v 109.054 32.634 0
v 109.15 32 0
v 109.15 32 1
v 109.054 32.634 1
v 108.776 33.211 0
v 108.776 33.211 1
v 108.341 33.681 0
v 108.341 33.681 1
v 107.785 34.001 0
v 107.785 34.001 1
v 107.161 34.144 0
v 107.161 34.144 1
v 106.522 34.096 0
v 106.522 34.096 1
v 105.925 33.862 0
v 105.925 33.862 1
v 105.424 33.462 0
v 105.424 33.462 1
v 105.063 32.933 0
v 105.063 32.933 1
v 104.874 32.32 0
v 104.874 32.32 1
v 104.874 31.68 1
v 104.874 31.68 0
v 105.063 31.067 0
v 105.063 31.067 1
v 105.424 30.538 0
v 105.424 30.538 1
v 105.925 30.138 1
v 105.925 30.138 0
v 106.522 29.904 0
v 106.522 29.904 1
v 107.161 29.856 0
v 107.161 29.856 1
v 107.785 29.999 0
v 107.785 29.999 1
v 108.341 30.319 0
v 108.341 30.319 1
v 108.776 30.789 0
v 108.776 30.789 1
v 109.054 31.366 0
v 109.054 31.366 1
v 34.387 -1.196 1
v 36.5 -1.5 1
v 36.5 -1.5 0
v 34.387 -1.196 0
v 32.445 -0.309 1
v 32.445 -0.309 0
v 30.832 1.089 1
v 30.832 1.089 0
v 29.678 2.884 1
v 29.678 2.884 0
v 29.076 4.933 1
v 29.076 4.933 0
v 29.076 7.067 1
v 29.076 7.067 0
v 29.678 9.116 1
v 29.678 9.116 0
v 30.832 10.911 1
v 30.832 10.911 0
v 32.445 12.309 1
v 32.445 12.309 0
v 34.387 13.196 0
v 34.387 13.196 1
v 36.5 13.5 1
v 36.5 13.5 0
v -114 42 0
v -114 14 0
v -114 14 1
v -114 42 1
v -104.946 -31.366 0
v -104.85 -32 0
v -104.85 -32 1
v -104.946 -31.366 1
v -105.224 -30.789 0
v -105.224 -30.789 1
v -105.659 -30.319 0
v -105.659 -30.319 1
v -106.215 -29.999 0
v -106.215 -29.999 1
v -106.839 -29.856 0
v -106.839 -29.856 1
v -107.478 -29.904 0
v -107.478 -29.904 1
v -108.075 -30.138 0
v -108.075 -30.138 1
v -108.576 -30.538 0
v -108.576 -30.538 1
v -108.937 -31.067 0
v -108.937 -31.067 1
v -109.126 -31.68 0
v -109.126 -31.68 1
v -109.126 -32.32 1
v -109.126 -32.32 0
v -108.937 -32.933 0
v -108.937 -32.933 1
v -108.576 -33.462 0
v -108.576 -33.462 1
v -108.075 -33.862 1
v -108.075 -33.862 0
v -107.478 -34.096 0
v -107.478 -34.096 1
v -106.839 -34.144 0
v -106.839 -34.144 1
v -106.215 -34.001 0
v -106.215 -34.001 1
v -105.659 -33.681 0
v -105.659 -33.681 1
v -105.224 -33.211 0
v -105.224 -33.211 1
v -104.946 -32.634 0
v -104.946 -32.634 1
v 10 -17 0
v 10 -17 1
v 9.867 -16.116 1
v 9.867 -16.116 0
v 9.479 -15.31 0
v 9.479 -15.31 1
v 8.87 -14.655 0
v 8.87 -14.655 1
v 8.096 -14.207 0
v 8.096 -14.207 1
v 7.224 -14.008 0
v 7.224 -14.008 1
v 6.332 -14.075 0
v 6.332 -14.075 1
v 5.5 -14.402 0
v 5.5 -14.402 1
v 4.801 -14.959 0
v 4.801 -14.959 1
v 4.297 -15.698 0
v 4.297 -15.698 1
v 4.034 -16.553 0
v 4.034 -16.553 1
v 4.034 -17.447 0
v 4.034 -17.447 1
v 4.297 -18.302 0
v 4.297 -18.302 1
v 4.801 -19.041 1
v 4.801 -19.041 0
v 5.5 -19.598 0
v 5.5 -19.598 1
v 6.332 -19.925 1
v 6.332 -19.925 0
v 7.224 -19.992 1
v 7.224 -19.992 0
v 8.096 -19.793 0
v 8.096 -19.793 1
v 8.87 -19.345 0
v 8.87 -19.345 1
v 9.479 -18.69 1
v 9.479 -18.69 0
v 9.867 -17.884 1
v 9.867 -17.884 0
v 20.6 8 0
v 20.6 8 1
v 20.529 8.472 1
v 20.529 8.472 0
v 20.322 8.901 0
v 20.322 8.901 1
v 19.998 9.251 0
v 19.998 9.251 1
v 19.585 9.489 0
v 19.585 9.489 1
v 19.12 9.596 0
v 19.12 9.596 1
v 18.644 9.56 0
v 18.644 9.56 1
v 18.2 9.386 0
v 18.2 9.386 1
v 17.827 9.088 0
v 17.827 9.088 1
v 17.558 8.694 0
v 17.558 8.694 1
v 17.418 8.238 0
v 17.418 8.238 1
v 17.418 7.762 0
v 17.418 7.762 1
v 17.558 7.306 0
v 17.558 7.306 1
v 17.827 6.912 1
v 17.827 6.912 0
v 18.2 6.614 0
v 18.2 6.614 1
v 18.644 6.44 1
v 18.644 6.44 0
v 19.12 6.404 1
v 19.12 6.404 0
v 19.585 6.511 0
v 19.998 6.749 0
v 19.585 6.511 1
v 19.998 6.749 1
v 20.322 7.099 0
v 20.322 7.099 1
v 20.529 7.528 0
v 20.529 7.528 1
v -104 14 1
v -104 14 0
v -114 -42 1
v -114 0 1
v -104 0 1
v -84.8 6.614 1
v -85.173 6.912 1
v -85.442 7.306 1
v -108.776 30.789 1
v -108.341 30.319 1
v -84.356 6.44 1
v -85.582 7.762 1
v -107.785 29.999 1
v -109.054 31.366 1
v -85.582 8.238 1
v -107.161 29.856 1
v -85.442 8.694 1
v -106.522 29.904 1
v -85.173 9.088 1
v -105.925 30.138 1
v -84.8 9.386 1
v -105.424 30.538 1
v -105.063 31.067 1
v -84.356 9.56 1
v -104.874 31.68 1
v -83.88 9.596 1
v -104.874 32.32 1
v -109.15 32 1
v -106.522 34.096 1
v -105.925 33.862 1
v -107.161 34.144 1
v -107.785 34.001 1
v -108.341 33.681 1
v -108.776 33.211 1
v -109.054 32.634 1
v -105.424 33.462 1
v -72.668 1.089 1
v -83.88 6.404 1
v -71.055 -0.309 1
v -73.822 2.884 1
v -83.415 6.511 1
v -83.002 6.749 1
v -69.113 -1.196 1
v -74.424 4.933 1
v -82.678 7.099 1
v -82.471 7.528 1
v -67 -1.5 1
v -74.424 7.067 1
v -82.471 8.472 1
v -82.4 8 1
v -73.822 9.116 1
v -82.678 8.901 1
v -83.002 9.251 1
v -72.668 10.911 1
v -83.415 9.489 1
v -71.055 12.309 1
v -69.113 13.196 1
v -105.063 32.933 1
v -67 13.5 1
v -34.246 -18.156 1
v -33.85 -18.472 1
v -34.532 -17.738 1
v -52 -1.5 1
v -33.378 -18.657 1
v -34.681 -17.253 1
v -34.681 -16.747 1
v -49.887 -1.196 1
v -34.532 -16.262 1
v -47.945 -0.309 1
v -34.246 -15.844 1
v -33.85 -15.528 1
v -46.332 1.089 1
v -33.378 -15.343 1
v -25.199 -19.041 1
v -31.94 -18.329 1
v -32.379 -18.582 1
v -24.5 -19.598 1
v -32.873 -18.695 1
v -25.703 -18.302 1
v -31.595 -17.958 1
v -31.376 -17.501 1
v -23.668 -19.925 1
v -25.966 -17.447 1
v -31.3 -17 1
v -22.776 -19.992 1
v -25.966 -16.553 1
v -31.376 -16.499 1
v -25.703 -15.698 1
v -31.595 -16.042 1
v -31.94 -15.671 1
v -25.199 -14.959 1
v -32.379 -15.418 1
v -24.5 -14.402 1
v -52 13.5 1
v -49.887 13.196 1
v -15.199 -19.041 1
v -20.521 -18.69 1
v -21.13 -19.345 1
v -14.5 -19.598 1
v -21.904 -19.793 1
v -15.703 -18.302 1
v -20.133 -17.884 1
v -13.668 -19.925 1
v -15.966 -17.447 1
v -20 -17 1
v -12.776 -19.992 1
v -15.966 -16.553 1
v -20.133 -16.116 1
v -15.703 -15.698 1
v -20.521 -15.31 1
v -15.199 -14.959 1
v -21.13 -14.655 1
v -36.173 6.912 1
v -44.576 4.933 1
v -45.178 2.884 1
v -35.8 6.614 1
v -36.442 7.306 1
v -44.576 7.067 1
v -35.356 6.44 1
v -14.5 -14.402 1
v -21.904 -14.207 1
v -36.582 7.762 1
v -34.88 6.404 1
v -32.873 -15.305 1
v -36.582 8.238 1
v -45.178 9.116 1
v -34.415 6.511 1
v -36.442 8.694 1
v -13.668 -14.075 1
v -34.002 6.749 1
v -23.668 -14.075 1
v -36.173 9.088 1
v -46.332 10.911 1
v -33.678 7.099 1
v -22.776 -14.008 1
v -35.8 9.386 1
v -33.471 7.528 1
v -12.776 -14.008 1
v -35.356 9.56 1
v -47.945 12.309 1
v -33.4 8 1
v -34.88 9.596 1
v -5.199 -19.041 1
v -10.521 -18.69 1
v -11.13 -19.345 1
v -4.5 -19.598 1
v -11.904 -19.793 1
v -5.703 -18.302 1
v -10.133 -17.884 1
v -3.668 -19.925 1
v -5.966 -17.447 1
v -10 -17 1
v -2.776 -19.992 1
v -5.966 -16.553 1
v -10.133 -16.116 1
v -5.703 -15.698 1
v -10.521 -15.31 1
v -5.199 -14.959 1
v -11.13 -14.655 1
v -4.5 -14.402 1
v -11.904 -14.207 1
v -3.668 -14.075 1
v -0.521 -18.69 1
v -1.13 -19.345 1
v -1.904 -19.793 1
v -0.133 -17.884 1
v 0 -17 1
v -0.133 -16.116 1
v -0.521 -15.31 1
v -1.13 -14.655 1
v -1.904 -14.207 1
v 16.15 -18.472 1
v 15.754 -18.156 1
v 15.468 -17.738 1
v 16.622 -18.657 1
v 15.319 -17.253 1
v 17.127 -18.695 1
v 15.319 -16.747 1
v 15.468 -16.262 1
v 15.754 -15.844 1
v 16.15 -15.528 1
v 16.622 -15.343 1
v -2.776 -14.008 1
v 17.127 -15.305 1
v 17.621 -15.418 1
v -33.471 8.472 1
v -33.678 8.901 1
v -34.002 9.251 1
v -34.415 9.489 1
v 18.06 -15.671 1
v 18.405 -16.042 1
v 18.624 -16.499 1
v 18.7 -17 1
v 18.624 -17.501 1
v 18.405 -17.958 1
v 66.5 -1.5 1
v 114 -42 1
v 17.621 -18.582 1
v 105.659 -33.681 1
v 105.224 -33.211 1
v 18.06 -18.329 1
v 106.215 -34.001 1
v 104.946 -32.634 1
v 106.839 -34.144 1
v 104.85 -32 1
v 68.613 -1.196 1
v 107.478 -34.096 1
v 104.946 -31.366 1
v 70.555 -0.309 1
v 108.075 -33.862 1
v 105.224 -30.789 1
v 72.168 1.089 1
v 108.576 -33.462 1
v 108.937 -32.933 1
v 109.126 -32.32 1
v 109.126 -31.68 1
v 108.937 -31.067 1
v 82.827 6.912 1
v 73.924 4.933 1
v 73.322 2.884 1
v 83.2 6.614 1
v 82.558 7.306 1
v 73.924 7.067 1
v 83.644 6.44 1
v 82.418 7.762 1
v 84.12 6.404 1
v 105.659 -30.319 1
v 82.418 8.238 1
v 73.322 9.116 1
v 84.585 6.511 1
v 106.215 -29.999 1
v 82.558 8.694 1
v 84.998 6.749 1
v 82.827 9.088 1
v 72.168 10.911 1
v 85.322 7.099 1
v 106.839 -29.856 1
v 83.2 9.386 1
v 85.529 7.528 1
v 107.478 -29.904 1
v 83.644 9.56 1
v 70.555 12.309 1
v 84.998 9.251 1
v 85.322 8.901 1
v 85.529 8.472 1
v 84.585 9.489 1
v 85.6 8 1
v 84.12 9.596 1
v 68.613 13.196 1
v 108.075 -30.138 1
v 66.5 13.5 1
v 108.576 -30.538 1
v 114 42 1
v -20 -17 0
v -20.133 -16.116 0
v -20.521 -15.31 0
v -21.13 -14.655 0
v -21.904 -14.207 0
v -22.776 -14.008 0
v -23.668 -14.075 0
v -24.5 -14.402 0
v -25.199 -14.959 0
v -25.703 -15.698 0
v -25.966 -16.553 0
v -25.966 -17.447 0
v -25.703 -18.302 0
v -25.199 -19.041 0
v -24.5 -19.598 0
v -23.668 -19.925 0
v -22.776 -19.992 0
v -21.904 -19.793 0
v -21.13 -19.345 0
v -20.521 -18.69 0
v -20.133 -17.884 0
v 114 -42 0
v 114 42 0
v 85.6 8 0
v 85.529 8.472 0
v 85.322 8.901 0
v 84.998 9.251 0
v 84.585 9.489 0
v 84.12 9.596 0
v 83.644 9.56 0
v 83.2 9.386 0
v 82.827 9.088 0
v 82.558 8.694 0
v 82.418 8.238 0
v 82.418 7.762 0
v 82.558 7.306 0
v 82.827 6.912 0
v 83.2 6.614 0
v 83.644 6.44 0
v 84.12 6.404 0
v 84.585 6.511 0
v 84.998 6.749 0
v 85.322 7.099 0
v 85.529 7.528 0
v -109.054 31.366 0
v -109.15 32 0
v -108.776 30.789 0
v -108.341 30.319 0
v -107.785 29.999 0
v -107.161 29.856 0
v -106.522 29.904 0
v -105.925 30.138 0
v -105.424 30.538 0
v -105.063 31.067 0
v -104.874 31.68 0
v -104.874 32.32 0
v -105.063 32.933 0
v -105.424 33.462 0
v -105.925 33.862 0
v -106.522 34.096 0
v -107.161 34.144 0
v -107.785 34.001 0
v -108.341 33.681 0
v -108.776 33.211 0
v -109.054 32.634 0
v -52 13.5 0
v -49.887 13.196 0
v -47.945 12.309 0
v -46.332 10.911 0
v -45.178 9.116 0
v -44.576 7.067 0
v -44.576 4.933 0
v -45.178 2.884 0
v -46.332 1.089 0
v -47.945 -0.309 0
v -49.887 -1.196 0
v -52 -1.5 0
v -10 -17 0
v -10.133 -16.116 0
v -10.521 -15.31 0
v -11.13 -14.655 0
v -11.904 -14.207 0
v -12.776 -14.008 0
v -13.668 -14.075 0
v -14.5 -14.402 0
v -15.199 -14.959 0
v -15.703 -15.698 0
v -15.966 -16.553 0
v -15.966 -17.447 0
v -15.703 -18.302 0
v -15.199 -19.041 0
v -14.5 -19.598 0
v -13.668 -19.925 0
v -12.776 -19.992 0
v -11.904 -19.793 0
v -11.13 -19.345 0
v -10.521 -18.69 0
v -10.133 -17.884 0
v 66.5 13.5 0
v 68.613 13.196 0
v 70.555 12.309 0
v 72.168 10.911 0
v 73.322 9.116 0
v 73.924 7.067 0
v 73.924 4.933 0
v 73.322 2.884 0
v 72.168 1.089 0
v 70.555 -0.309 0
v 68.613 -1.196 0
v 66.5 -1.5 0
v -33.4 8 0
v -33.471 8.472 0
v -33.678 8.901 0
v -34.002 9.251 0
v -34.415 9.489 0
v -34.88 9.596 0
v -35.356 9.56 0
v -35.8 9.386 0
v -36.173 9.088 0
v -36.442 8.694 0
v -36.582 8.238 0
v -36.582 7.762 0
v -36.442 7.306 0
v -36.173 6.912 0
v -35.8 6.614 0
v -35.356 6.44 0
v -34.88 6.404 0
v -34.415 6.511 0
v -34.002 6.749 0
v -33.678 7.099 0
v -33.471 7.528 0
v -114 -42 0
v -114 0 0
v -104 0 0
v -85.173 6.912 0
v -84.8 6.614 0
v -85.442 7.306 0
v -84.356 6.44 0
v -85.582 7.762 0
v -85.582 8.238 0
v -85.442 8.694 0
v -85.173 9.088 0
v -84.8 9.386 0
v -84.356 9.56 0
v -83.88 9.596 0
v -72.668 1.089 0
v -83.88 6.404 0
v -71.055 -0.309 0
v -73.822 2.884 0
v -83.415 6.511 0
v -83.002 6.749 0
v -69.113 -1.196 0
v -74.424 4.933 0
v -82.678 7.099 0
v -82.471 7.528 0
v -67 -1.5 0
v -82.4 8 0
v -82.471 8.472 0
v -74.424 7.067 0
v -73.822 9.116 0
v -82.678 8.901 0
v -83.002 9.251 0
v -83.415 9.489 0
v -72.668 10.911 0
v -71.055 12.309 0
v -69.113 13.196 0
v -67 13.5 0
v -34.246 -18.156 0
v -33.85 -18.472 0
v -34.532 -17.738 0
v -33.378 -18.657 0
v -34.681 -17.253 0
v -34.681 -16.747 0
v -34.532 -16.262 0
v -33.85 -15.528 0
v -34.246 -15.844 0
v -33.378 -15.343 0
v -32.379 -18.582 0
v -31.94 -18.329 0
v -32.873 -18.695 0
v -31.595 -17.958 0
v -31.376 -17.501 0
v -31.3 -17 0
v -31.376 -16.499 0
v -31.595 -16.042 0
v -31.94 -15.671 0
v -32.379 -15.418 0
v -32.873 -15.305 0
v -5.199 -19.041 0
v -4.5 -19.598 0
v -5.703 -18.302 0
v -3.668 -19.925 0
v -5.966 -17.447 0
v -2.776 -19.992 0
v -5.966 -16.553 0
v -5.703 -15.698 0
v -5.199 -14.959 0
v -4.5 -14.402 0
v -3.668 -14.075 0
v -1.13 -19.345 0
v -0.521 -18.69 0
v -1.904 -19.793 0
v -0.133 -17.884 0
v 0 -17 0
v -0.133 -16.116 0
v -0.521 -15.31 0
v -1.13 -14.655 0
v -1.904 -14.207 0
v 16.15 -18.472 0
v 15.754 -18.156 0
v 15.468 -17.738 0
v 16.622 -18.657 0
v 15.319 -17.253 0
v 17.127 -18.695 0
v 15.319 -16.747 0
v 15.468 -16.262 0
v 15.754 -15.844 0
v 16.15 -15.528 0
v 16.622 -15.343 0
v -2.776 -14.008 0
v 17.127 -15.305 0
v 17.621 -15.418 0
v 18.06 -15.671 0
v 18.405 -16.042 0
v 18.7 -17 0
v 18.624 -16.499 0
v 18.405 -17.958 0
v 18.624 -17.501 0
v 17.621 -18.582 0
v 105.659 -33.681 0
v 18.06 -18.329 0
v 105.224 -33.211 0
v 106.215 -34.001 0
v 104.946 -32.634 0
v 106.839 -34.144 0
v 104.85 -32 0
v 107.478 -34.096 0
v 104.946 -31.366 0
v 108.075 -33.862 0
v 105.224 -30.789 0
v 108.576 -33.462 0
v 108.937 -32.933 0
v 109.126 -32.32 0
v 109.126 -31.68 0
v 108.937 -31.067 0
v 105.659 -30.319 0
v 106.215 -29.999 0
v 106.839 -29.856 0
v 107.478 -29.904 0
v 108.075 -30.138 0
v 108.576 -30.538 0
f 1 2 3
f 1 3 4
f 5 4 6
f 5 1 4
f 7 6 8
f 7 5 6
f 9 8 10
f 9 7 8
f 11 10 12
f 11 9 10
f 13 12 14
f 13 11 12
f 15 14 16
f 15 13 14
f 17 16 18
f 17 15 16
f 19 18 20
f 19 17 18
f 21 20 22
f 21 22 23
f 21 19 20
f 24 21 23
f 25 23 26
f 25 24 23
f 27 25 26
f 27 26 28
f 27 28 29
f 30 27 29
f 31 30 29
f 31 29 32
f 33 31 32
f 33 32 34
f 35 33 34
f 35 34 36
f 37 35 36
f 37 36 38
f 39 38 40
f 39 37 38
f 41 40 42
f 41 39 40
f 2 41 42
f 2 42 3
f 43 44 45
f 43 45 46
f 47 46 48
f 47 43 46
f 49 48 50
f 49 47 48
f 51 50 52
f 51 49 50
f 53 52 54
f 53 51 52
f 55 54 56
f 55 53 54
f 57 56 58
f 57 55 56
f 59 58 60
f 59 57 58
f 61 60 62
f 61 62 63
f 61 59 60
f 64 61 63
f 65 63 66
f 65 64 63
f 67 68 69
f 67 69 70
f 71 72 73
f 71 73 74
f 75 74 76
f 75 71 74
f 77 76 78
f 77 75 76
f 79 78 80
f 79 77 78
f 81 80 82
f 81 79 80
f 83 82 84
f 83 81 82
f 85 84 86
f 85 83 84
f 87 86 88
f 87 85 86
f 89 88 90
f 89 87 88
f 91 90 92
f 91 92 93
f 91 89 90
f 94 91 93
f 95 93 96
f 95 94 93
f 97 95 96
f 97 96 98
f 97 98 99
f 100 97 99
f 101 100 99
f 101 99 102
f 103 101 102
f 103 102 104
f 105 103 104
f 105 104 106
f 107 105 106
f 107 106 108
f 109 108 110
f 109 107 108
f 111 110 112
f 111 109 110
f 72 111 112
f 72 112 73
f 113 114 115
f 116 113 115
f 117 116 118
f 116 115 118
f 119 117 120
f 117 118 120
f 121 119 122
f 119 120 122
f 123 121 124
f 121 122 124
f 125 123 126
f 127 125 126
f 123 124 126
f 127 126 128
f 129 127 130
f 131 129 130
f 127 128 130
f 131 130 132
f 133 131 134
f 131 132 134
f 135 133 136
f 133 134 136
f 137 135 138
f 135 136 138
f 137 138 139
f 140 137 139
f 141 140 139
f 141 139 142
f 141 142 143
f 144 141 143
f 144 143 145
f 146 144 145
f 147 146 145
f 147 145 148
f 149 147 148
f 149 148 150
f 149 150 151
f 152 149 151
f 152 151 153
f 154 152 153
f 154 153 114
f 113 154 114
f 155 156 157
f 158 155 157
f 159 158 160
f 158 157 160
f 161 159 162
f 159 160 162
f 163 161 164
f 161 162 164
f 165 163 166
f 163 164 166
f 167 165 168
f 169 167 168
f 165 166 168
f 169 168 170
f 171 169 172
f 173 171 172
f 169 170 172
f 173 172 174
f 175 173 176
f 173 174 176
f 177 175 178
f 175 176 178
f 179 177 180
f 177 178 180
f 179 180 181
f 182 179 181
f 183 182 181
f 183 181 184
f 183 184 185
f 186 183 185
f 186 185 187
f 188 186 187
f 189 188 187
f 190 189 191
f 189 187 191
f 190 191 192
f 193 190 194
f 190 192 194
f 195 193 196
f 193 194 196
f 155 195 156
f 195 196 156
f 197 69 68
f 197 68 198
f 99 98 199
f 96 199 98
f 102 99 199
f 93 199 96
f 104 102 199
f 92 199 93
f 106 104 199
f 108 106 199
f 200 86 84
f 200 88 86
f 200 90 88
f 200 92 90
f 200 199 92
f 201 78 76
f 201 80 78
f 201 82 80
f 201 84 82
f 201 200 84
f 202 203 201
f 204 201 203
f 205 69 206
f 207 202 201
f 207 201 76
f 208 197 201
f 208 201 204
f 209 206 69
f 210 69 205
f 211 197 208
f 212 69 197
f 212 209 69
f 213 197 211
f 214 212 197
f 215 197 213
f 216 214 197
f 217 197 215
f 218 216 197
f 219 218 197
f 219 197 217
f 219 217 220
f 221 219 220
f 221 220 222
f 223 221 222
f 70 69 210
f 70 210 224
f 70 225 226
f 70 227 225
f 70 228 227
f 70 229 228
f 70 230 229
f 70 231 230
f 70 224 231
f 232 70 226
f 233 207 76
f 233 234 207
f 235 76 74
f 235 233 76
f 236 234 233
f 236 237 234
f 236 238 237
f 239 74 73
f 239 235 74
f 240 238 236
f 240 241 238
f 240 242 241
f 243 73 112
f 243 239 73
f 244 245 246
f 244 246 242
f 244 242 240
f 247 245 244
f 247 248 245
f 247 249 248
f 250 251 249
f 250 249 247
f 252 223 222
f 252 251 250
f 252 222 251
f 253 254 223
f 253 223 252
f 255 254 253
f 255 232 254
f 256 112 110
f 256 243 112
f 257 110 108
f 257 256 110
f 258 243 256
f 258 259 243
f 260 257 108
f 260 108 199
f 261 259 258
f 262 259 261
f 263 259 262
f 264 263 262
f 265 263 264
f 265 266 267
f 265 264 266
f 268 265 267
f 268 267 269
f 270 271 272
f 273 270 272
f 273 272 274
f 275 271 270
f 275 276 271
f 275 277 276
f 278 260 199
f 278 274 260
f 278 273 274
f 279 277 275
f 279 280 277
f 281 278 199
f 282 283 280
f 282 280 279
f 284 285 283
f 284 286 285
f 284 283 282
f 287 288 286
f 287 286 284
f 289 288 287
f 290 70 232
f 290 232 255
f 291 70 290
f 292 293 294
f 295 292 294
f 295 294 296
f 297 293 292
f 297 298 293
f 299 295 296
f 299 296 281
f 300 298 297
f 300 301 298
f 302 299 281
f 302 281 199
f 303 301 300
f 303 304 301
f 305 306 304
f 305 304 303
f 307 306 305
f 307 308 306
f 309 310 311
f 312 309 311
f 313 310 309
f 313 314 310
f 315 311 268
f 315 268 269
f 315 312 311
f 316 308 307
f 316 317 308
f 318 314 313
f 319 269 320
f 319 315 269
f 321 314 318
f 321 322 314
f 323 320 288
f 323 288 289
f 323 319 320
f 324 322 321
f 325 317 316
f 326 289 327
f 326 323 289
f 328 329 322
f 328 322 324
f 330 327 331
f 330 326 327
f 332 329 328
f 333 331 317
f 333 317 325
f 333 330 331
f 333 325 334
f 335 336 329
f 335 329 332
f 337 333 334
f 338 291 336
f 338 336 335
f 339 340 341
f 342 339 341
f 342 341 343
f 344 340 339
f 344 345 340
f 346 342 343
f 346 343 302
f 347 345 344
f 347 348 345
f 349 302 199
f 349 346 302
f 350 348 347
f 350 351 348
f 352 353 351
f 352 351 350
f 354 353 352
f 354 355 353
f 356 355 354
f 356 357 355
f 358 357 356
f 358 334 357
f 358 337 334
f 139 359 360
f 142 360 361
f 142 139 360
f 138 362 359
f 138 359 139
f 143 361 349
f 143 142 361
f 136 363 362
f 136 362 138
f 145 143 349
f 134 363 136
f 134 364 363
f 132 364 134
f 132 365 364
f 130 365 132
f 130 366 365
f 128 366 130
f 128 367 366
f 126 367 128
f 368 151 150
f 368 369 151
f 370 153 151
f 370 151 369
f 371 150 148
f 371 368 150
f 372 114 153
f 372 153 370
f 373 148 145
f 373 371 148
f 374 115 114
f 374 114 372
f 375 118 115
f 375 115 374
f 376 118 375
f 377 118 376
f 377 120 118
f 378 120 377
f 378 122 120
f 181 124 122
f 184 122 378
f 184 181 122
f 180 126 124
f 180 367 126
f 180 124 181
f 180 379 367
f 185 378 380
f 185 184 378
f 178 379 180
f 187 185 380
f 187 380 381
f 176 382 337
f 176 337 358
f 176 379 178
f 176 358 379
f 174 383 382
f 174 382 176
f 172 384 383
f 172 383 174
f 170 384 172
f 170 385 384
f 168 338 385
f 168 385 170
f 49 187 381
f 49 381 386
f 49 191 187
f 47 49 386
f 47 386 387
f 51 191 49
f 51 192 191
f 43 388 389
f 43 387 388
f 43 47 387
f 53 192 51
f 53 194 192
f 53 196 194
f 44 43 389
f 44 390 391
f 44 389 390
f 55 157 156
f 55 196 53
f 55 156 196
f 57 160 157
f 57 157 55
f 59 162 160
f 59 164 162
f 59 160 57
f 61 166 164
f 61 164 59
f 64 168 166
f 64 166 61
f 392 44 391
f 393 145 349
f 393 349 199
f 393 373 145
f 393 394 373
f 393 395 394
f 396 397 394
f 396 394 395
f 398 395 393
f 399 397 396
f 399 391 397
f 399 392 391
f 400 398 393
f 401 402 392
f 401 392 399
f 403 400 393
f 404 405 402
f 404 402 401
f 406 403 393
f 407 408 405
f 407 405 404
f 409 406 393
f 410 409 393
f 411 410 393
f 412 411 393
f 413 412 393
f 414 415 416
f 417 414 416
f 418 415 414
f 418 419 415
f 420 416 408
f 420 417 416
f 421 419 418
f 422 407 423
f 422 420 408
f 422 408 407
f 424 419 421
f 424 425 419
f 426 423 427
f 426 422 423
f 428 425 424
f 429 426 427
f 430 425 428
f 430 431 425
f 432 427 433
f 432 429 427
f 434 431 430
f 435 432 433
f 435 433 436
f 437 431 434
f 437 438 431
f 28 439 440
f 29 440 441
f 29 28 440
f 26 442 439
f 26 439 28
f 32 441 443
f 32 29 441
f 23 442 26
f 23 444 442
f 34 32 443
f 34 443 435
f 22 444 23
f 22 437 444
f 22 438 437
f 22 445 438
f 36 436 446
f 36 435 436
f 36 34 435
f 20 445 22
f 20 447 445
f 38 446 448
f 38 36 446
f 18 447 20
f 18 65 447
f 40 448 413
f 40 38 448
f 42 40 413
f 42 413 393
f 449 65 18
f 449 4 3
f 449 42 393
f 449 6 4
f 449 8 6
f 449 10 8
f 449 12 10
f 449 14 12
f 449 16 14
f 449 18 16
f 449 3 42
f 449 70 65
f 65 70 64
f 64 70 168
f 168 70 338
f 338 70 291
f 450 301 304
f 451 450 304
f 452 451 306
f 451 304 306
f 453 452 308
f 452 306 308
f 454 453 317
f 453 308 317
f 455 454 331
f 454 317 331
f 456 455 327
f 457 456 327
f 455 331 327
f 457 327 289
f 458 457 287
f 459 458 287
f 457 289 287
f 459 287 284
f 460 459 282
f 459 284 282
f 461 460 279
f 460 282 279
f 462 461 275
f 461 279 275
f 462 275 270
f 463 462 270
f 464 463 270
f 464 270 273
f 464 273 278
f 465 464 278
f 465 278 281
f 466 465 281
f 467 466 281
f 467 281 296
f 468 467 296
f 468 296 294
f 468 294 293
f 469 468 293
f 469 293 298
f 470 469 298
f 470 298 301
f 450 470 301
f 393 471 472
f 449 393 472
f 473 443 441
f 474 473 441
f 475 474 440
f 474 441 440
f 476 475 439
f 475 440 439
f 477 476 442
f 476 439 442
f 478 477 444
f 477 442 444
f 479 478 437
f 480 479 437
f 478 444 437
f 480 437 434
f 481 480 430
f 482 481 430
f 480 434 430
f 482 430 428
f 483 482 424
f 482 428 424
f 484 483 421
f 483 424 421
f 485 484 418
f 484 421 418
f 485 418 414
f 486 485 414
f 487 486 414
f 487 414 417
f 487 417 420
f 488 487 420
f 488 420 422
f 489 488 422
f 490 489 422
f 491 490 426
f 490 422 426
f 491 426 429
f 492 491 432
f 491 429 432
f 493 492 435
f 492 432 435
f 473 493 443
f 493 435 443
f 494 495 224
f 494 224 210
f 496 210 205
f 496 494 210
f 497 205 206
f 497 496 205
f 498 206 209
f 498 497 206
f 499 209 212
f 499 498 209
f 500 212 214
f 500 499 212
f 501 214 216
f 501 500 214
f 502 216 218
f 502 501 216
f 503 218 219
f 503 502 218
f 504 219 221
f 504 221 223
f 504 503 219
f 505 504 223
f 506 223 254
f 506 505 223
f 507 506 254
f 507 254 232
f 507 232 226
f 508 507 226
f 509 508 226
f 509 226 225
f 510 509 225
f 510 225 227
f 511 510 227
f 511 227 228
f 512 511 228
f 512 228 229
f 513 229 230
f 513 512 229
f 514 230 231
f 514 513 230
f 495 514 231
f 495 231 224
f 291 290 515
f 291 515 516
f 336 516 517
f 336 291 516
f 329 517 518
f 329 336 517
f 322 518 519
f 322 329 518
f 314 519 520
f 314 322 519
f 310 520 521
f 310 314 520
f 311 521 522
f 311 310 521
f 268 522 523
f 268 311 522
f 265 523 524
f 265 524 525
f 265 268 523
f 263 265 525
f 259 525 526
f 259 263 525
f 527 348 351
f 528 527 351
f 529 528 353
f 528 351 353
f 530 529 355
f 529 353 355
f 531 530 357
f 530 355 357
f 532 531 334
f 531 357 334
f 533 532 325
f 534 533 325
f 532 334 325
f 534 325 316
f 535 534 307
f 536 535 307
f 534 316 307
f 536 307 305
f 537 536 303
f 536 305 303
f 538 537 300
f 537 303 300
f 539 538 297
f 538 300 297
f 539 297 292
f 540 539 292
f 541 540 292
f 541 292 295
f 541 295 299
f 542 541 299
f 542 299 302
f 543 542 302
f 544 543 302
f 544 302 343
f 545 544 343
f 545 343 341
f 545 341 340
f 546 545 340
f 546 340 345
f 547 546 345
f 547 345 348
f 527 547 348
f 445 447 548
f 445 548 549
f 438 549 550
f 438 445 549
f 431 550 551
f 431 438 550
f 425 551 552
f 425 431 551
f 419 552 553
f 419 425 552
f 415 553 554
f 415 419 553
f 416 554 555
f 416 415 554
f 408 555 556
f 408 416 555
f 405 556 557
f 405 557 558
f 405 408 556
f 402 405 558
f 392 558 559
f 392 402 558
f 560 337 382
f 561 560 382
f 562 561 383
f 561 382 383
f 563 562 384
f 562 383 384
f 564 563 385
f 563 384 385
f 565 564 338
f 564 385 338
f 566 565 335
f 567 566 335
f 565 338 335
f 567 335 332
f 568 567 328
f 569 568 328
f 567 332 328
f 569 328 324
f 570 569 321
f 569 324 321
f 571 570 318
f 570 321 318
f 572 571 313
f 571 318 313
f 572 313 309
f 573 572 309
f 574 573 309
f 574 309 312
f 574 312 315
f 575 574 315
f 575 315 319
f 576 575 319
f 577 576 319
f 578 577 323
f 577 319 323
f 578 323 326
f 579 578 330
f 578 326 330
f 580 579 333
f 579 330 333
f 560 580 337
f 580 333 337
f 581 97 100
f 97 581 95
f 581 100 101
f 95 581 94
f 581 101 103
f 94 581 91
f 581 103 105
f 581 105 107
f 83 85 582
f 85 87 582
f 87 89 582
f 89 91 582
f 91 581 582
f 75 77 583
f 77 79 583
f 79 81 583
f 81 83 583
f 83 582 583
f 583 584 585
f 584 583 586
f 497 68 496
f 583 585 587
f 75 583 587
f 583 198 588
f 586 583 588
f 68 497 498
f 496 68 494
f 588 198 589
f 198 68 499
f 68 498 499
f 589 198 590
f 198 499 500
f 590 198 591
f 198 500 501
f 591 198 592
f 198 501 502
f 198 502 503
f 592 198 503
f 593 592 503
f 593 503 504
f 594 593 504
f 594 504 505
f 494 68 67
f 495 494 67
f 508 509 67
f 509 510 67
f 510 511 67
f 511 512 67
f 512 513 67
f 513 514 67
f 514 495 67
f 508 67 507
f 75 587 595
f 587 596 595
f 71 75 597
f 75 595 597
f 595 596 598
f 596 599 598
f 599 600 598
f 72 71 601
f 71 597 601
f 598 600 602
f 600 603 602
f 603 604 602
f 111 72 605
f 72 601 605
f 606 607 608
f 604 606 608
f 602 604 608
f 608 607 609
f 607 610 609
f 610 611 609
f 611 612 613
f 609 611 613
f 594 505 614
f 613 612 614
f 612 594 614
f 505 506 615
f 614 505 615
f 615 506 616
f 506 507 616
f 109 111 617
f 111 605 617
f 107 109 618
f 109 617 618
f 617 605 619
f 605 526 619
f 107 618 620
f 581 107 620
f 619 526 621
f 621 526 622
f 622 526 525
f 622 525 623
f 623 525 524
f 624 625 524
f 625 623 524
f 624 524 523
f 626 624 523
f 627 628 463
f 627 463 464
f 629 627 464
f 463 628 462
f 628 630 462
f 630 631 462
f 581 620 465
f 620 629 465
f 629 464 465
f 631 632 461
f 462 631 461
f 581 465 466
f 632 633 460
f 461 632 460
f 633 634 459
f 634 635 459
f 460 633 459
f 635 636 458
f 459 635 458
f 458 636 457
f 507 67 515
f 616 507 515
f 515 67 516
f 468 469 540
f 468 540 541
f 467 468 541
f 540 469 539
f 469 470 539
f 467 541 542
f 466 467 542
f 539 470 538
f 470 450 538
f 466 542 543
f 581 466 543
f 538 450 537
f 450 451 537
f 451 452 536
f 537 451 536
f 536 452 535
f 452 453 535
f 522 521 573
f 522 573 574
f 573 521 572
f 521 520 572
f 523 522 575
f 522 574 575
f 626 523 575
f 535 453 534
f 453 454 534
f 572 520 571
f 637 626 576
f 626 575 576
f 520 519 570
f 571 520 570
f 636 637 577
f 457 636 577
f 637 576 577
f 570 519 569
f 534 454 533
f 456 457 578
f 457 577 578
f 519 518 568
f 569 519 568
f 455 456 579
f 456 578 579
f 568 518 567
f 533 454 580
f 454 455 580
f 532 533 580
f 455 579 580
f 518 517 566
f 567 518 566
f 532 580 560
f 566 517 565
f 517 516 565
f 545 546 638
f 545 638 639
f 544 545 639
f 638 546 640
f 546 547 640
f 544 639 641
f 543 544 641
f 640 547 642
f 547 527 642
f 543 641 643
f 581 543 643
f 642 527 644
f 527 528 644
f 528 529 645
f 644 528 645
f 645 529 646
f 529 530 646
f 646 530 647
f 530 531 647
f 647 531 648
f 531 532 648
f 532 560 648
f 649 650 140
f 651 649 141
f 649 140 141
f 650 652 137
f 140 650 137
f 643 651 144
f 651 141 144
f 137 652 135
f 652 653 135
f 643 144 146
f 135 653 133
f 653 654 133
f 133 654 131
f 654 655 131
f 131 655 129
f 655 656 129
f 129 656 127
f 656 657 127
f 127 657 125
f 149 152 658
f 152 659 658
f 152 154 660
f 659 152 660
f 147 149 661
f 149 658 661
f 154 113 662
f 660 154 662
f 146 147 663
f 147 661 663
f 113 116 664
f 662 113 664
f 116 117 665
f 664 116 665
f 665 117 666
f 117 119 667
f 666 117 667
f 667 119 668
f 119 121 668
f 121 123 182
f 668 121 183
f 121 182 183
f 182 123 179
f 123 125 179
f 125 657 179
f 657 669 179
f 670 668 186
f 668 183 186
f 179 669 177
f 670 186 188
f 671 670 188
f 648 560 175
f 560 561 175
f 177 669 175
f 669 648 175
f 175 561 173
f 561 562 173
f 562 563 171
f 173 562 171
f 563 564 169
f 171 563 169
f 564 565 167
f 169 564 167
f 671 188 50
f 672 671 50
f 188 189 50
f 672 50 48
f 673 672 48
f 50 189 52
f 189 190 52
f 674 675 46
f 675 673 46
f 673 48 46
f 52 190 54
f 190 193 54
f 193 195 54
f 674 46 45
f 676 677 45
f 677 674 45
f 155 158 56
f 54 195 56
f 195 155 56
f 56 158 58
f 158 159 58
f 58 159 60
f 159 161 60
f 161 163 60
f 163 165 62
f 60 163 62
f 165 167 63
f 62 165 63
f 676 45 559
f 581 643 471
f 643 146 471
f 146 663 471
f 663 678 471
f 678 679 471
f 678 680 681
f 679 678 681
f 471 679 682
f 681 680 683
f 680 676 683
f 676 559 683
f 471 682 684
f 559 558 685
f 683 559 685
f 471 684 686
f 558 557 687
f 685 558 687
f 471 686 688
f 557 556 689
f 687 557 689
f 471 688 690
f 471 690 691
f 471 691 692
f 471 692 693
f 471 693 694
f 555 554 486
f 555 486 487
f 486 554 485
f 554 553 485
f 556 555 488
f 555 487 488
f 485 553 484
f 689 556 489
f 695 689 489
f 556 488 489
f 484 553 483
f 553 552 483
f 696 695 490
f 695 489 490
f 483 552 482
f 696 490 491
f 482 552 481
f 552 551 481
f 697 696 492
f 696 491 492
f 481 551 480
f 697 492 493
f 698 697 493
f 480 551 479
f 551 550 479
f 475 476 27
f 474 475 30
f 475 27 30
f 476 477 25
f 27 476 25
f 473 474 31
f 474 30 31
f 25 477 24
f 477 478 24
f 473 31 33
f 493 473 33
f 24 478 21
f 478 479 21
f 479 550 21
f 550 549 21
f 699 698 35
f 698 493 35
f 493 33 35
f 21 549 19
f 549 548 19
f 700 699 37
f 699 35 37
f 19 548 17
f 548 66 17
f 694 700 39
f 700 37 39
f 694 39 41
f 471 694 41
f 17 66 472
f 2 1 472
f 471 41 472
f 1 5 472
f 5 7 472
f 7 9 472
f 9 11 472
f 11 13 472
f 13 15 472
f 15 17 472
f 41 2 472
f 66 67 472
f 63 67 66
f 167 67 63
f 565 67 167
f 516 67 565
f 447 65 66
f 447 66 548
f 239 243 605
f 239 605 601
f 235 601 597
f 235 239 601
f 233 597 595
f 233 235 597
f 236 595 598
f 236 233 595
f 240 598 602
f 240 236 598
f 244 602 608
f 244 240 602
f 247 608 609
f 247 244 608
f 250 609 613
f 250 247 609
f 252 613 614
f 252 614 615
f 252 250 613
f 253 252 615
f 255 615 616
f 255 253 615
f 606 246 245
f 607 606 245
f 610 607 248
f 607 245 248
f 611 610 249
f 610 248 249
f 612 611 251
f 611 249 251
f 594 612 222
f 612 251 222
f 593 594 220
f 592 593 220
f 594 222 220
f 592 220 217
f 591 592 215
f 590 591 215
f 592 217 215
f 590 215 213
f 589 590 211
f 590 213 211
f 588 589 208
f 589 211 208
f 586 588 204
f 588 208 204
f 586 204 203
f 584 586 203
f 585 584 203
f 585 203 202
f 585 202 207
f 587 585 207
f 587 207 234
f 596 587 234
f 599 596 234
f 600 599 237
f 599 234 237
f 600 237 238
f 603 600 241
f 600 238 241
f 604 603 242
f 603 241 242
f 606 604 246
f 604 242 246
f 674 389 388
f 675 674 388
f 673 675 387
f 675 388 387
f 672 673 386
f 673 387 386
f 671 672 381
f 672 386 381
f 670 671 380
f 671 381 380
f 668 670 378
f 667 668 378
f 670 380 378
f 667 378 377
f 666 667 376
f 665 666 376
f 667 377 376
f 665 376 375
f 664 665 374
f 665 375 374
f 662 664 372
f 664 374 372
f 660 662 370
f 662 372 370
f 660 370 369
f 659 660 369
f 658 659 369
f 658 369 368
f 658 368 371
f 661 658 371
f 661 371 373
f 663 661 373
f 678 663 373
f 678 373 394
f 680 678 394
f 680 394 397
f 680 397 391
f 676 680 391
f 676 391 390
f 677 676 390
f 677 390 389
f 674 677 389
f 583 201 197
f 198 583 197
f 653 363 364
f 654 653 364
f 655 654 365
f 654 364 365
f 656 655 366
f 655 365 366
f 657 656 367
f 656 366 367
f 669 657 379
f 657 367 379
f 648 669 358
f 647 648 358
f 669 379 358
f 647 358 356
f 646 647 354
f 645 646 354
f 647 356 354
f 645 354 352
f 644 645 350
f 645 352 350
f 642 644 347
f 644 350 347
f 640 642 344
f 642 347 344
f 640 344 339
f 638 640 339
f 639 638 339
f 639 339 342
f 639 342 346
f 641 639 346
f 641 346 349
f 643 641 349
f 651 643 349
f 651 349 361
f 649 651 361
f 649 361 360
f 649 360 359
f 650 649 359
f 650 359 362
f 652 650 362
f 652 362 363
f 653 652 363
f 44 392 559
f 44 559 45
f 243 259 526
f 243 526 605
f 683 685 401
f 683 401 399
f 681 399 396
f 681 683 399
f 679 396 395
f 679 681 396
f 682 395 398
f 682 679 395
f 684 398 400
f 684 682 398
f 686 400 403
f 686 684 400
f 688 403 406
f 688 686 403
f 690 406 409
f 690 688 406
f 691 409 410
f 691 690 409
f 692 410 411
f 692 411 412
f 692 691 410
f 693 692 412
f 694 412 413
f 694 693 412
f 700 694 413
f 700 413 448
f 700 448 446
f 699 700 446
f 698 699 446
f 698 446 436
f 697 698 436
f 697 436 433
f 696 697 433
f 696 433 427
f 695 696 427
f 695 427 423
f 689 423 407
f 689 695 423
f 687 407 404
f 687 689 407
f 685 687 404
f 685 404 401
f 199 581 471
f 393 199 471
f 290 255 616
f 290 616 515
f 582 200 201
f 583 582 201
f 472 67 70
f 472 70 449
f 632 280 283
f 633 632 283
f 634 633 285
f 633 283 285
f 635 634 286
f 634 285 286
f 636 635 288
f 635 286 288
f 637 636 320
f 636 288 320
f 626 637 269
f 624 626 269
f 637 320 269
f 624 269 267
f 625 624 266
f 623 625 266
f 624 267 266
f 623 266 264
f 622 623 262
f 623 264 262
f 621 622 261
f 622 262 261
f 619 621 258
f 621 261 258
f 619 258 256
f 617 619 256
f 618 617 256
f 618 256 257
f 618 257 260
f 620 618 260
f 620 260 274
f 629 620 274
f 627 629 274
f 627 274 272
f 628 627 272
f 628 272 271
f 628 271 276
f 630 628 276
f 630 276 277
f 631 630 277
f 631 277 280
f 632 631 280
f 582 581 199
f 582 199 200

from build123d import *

# Parameters (mm, degrees)
SKETCH_1_W          = 228
SKETCH_1_H          = 84
SKETCH_1_R          = 2.15
EXTRUDE_1_DEPTH     = 1
SKETCH_4_R          = 1.6
SKETCH_4_W          = 14.464145402
SKETCH_4_H          = 14
CUT_EXTRUDE_2_DEPTH = 1
SKETCH_5_R          = 1.7
SKETCH_5_R_2        = 3
CUT_EXTRUDE_3_DEPTH = 10


with BuildPart() as part:
    # Эскиз1 → Вытянуть1 (new body)
    with BuildSketch(Plane.XY):
        Rectangle(SKETCH_1_W, SKETCH_1_H)
        with Locations((107, 32)):
            Circle(SKETCH_1_R, mode=Mode.SUBTRACT)
        with Locations(Location((-107, 32, 0), (0, 0, 180))):
            Circle(SKETCH_1_R, mode=Mode.SUBTRACT)
        with Locations((-107, -32)):
            Circle(SKETCH_1_R, mode=Mode.SUBTRACT)
        with Locations(Location((107, -32, 0), (0, 0, 180))):
            Circle(SKETCH_1_R, mode=Mode.SUBTRACT)
    extrude(amount=EXTRUDE_1_DEPTH)

    # Эскиз4 → Вырез-Вытянуть2 (cut)
    with BuildSketch(Plane.XY.offset(1)):
        with Locations((19, 8)):
            Circle(SKETCH_4_R)
        with Locations((84, 8)):
            Circle(SKETCH_4_R)
        with Locations((-84, 8)):
            Circle(SKETCH_4_R)
        with Locations((-35, 8)):
            Circle(SKETCH_4_R)
        with BuildLine():
            Line((36.5, 13.5), (66.5, 13.5))
            ThreePointArc((66.5, 13.5), (74, 6), (66.5, -1.5))
            Line((66.5, -1.5), (36.5, -1.5))
            ThreePointArc((36.5, -1.5), (29, 6), (36.5, 13.5))
        make_face()
        with BuildLine():
            Line((-67, 13.5), (-52, 13.5))
            ThreePointArc((-52, 13.5), (-44.5, 6), (-52, -1.5))
            Line((-52, -1.5), (-67, -1.5))
            ThreePointArc((-67, -1.5), (-74.5, 6), (-67, 13.5))
        make_face()
        with Locations((-111.232072701, 7)):
            Rectangle(SKETCH_4_W, SKETCH_4_H)
    extrude(amount=-CUT_EXTRUDE_2_DEPTH, mode=Mode.SUBTRACT)

    # Эскиз5 → Вырез-Вытянуть3 (cut)
    with BuildSketch(Plane.XY.offset(1)):
        with Locations((-33, -17)):
            Circle(SKETCH_5_R)
        with Locations((17, -17)):
            Circle(SKETCH_5_R)
        with Locations((7, -17)):
            Circle(SKETCH_5_R_2)
        with Locations((-3, -17)):
            Circle(SKETCH_5_R_2)
        with Locations((-13, -17)):
            Circle(SKETCH_5_R_2)
        with Locations((-23, -17)):
            Circle(SKETCH_5_R_2)
    extrude(amount=-CUT_EXTRUDE_3_DEPTH, mode=Mode.SUBTRACT)


solid = part.part
